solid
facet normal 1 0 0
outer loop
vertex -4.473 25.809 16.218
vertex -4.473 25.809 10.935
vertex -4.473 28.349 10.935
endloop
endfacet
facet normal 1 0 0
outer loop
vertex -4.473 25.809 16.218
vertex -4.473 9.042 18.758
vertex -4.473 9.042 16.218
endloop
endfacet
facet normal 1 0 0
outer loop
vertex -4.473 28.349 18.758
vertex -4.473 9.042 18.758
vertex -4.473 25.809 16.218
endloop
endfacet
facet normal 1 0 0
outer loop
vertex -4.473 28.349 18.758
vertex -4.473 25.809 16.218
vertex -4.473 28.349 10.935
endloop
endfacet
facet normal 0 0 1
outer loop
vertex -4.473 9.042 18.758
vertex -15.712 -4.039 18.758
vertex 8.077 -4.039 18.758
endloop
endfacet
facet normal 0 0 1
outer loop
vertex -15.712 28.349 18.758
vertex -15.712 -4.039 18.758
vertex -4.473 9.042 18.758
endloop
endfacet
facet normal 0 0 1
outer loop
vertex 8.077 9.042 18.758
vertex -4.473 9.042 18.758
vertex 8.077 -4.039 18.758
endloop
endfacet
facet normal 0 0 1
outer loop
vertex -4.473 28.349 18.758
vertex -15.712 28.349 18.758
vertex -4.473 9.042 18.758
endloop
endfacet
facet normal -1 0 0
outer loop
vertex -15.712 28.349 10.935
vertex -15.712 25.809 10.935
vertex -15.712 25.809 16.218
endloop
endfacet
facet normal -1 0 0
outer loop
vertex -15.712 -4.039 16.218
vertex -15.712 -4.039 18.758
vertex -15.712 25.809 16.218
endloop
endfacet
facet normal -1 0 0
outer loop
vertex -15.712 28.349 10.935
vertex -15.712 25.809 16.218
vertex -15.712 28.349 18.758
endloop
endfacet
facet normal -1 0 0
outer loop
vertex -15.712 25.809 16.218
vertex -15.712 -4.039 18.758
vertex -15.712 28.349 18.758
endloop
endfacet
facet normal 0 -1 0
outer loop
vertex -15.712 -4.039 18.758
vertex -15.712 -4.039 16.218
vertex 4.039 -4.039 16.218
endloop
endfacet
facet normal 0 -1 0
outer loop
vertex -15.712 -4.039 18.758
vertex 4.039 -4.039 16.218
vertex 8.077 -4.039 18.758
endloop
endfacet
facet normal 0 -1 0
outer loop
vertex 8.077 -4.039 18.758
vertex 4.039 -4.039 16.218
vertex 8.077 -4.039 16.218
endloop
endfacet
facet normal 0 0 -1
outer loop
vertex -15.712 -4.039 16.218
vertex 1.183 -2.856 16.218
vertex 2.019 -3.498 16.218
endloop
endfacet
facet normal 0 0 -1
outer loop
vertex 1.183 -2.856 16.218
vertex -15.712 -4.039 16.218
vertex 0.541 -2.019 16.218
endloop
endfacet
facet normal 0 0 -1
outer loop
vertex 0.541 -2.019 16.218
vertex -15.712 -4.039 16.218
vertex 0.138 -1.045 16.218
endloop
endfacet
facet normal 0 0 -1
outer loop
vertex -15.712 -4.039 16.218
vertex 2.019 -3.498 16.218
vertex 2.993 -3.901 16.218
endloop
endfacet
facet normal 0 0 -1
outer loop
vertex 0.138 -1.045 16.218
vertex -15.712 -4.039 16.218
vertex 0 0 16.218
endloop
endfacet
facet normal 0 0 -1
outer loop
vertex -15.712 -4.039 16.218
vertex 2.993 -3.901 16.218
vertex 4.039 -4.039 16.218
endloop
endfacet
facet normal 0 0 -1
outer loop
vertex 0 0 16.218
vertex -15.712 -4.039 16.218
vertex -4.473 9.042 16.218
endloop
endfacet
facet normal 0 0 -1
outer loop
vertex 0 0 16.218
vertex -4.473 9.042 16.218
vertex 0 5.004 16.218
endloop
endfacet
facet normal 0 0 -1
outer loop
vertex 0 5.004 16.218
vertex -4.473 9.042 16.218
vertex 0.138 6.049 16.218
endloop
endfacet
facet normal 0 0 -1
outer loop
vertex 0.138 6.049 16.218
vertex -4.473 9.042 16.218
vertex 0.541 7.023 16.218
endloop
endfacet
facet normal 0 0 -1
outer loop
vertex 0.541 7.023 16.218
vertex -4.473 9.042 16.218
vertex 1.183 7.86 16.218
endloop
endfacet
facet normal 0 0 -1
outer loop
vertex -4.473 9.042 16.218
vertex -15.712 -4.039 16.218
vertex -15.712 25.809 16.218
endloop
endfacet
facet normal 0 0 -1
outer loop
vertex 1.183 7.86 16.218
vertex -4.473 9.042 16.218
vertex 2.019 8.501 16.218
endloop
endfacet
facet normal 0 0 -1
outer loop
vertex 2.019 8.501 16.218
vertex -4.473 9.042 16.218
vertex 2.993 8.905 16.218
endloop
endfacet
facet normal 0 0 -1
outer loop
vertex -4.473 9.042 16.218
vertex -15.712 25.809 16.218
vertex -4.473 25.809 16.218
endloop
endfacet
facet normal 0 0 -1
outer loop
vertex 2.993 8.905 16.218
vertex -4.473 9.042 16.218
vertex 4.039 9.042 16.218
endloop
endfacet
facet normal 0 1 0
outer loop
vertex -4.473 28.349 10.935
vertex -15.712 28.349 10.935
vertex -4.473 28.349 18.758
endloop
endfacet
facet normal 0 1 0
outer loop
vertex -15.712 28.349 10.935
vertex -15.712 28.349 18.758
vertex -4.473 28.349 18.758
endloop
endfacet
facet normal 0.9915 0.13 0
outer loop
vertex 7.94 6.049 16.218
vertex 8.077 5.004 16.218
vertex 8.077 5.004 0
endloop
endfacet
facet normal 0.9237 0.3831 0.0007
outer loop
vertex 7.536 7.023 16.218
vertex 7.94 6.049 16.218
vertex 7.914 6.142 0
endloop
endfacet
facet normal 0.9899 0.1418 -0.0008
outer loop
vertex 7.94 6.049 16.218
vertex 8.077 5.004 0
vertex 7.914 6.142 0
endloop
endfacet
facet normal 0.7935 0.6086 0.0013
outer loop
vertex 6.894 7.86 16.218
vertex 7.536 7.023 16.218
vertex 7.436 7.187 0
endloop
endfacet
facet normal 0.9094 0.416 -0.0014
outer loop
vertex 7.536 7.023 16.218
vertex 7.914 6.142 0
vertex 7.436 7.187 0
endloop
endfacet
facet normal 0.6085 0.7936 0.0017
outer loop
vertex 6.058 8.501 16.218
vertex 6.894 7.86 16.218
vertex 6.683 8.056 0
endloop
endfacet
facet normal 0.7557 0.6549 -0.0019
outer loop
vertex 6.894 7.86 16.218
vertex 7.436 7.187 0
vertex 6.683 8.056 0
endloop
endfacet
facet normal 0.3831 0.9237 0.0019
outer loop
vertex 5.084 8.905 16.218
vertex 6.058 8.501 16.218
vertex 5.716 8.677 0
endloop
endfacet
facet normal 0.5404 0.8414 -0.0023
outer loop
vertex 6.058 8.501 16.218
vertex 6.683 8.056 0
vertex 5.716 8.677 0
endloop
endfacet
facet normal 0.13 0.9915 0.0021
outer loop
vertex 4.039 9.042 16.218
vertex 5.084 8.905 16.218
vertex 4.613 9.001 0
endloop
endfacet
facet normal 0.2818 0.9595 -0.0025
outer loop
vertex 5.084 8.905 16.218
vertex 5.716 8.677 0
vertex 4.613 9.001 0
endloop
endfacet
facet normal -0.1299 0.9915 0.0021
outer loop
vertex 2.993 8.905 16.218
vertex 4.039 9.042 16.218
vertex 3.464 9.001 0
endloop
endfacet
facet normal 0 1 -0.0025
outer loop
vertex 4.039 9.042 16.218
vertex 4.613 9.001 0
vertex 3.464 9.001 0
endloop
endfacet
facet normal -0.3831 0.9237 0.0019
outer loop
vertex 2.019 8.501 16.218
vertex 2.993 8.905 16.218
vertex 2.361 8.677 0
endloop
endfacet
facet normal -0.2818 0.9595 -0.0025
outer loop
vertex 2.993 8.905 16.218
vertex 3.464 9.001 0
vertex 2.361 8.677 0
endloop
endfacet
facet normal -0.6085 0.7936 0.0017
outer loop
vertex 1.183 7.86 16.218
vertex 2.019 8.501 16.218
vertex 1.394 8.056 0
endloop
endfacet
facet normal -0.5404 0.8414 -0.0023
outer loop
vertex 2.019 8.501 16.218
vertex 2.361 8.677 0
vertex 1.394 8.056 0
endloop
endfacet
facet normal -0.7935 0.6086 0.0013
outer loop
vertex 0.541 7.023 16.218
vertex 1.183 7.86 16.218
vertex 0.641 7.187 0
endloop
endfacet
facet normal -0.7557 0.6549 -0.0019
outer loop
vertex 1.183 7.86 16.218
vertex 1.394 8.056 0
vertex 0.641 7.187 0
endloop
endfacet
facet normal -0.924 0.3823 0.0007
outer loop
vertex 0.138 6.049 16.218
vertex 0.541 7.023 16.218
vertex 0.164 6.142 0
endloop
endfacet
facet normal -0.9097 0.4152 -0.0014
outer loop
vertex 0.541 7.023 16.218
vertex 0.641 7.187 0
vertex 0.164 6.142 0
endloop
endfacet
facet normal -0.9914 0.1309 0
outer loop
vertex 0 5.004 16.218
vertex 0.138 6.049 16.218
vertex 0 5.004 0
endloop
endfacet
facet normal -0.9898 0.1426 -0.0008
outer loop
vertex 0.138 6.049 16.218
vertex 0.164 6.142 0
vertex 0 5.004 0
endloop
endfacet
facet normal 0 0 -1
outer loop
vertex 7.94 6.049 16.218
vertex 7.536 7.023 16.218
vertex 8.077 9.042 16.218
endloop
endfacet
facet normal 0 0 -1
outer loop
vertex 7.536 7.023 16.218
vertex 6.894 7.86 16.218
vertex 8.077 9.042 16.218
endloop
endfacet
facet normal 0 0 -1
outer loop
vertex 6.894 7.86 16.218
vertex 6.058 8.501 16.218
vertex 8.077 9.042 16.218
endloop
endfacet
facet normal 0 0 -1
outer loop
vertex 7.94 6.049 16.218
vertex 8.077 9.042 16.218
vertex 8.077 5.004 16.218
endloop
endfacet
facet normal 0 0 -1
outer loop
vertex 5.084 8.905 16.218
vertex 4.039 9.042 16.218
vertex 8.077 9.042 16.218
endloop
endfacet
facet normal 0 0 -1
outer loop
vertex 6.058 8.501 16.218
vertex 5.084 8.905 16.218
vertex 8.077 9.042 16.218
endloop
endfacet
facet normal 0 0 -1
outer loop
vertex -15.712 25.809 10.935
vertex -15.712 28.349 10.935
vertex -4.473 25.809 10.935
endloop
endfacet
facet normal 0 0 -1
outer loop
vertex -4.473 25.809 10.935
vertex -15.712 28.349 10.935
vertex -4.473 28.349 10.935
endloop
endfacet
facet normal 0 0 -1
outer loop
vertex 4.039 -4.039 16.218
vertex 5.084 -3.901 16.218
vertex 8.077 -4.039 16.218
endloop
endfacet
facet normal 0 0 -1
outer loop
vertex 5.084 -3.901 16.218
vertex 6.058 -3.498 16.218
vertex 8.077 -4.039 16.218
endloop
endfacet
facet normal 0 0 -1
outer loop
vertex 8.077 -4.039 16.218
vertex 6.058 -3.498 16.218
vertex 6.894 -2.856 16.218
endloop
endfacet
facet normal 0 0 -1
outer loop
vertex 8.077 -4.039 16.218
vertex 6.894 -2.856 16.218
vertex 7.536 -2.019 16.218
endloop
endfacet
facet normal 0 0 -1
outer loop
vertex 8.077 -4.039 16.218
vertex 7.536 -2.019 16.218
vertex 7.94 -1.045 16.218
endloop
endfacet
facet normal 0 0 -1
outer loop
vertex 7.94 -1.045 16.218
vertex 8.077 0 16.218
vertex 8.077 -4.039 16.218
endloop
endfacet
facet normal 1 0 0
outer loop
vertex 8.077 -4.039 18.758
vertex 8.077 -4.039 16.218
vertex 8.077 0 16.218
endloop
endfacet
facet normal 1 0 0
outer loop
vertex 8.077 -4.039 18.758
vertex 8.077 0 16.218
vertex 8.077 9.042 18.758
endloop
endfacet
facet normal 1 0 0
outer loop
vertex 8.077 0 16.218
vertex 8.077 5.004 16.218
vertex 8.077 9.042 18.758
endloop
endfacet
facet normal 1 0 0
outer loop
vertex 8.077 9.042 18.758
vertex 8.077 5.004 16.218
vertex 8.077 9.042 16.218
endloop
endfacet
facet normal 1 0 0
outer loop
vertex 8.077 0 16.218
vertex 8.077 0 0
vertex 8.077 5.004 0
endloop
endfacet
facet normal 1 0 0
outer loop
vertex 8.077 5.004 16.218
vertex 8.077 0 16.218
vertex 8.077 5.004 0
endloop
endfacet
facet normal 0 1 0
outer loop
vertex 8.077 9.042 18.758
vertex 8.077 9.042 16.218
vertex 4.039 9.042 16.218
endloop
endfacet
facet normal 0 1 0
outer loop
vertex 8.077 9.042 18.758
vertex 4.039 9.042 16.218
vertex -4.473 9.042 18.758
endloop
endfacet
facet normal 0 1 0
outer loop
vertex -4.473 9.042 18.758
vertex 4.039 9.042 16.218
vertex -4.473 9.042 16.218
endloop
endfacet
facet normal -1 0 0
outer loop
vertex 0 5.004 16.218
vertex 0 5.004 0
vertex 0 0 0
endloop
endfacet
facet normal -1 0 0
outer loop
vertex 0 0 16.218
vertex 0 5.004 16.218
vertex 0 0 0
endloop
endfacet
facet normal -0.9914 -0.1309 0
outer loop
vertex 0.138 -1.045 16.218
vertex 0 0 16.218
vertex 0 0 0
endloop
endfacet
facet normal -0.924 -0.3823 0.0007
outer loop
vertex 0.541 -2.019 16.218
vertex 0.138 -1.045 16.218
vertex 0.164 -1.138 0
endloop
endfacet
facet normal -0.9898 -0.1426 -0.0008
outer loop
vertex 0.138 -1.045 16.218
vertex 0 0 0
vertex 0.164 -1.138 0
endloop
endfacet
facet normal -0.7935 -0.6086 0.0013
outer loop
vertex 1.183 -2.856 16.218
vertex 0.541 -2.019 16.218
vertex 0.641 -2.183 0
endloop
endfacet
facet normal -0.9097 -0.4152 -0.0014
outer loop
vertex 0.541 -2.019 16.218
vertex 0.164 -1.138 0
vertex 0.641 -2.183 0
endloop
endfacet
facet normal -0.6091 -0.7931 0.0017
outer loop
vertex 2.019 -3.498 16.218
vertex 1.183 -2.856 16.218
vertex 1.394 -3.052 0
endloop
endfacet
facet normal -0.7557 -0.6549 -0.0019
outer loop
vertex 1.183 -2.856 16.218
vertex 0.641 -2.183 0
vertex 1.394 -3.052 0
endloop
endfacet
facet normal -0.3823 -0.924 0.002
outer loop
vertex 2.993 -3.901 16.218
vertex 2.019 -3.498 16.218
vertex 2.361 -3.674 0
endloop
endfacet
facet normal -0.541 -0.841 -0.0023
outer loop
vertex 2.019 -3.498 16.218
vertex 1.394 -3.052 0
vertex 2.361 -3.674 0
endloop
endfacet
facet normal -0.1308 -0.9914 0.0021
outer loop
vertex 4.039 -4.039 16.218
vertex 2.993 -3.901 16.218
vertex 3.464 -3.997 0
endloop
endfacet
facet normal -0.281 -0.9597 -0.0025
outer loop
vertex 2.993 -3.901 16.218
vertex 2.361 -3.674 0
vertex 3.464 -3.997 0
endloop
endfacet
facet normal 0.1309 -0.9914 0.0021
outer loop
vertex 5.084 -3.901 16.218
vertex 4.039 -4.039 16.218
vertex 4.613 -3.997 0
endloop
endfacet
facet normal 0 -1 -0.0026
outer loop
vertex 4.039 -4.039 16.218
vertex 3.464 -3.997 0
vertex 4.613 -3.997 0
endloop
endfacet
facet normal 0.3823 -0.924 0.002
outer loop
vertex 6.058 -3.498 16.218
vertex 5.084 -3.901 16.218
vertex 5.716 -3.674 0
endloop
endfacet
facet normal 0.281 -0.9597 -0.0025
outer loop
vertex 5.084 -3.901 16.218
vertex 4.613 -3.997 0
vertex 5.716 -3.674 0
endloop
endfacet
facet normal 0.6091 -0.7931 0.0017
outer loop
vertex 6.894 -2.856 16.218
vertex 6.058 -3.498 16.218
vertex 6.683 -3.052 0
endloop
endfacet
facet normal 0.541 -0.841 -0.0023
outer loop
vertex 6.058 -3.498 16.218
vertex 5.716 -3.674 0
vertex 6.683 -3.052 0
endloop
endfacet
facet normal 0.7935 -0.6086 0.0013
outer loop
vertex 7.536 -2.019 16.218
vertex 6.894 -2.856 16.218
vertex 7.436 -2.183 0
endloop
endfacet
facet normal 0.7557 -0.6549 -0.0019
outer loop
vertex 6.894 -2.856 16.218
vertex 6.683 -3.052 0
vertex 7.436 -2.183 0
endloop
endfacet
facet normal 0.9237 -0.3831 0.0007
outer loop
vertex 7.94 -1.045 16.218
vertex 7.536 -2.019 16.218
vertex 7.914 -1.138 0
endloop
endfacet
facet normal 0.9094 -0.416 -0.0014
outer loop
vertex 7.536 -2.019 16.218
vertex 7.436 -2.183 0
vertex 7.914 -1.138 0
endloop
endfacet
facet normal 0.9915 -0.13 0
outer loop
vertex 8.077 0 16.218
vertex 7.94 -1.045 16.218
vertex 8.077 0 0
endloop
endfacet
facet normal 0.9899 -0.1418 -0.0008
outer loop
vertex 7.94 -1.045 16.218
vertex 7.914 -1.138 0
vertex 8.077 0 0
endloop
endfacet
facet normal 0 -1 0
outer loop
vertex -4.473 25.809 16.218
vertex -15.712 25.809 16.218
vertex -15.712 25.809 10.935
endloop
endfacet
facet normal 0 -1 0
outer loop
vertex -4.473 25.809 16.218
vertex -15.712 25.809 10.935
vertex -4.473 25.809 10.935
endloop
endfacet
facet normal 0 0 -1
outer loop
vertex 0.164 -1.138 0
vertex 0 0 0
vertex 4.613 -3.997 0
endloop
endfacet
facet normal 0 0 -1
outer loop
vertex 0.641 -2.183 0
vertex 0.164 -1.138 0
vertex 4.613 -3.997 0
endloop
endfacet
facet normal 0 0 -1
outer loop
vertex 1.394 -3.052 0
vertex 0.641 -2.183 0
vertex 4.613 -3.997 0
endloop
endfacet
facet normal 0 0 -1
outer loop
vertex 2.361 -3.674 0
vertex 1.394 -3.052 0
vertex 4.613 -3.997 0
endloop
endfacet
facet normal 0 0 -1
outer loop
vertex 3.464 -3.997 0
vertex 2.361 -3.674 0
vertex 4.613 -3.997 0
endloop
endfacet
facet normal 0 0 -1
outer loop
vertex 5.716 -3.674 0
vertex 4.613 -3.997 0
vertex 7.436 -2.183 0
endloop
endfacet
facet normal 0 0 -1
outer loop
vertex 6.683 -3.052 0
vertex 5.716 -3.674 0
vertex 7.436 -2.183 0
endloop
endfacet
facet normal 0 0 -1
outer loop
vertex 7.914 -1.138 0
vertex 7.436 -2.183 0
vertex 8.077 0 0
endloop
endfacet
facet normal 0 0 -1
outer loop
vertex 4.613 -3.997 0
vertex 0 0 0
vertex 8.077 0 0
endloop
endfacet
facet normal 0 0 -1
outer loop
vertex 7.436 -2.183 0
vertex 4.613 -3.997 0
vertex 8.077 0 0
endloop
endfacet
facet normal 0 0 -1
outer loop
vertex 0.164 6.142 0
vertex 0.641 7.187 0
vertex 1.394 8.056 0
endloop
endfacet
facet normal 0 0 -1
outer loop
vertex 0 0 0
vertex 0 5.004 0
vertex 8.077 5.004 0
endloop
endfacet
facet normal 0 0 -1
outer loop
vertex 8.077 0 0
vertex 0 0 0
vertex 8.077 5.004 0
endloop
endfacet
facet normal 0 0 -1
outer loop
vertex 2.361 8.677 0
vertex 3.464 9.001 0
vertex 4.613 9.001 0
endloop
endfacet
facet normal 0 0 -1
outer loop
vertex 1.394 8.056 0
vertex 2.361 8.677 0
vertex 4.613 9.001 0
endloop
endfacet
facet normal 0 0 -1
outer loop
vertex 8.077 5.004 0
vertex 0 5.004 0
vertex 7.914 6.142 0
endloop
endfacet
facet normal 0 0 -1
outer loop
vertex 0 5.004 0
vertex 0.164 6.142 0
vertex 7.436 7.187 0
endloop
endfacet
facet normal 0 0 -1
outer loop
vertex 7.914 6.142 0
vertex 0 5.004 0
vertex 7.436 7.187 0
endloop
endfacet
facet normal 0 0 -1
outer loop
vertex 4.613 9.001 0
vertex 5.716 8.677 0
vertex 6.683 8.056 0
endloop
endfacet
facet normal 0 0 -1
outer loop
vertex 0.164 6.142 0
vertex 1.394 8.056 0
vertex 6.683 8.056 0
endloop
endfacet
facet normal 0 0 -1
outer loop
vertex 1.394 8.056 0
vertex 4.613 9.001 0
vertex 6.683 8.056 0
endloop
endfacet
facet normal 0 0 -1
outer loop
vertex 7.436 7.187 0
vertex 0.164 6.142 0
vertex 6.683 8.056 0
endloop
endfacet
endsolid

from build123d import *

# Parameters (mm, degrees)
F1_DEPTH = 16.2179
F2_W     = 11.2395
F2_H     = 2.54
F3_DEPTH = 2.54
F4_DEPTH = 5.2832


with BuildPart() as f1:
    # F0 (on Top) → F1 (new body)
    with BuildSketch(Plane.XY):
        with BuildLine():
            Line((0, 5.0038), (0, 0))
            ThreePointArc((0, 0), (4.0386, -4.0386), (8.0772, 0))
            Line((8.0772, 0), (8.0772, 5.0038))
            ThreePointArc((8.0772, 5.0038), (4.0386, 9.0424), (0, 5.0038))
        make_face()
    extrude(amount=F1_DEPTH)

    # F2 (on face) → F3 (join)
    with BuildSketch(Plane.XY.offset(16.2179)):
        with BuildLine():
            Line((4.0386, -4.0386), (8.0772, -4.0386))
            Line((8.0772, -4.0386), (8.0772, 0))
            ThreePointArc((8.0772, 0), (6.8943214465, -2.8557214465), (4.0386, -4.0386))
        make_face()
        with BuildLine():
            ThreePointArc((4.0386, 9.0424), (6.8943214465, 7.8595214465), (8.0772, 5.0038))
            Line((8.0772, 5.0038), (8.0772, 9.0424))
            Line((8.0772, 9.0424), (4.0386, 9.0424))
        make_face()
        with BuildLine():
            ThreePointArc((0, 0), (1.1828785535, -2.8557214465), (4.0386, -4.0386))
            ThreePointArc((4.0386, -4.0386), (6.8943214465, -2.8557214465), (8.0772, 0))
            Line((8.0772, 0), (8.0772, 5.0038))
            ThreePointArc((8.0772, 5.0038), (6.8943214465, 7.8595214465), (4.0386, 9.0424))
            ThreePointArc((4.0386, 9.0424), (1.1828785535, 7.8595214465), (0, 5.0038))
            Line((0, 5.0038), (0, 0))
        make_face()
        with BuildLine():
            Line((-4.47294, -4.0386), (4.0386, -4.0386))
            ThreePointArc((4.0386, -4.0386), (1.1828785535, -2.8557214465), (0, 0))
            Line((0, 0), (0, 5.0038))
            ThreePointArc((0, 5.0038), (1.1828785535, 7.8595214465), (4.0386, 9.0424))
            Line((4.0386, 9.0424), (-4.47294, 9.0424))
            Line((-4.47294, 9.0424), (-4.47294, 25.80894))
            Line((-4.47294, 25.80894), (-15.71244, 25.80894))
            Line((-15.71244, 25.80894), (-15.71244, -4.0386))
            Line((-15.71244, -4.0386), (-4.47294, -4.0386))
        make_face()
        with Locations((-10.09269, 27.07894)):
            Rectangle(F2_W, F2_H)
    extrude(amount=F3_DEPTH)

    # F2 (on face) → F4 (join)
    with BuildSketch(Plane.XY.offset(16.2179)):
        with Locations((-10.09269, 27.07894)):
            Rectangle(F2_W, F2_H)
    extrude(amount=-F4_DEPTH)


solid = f1.part
